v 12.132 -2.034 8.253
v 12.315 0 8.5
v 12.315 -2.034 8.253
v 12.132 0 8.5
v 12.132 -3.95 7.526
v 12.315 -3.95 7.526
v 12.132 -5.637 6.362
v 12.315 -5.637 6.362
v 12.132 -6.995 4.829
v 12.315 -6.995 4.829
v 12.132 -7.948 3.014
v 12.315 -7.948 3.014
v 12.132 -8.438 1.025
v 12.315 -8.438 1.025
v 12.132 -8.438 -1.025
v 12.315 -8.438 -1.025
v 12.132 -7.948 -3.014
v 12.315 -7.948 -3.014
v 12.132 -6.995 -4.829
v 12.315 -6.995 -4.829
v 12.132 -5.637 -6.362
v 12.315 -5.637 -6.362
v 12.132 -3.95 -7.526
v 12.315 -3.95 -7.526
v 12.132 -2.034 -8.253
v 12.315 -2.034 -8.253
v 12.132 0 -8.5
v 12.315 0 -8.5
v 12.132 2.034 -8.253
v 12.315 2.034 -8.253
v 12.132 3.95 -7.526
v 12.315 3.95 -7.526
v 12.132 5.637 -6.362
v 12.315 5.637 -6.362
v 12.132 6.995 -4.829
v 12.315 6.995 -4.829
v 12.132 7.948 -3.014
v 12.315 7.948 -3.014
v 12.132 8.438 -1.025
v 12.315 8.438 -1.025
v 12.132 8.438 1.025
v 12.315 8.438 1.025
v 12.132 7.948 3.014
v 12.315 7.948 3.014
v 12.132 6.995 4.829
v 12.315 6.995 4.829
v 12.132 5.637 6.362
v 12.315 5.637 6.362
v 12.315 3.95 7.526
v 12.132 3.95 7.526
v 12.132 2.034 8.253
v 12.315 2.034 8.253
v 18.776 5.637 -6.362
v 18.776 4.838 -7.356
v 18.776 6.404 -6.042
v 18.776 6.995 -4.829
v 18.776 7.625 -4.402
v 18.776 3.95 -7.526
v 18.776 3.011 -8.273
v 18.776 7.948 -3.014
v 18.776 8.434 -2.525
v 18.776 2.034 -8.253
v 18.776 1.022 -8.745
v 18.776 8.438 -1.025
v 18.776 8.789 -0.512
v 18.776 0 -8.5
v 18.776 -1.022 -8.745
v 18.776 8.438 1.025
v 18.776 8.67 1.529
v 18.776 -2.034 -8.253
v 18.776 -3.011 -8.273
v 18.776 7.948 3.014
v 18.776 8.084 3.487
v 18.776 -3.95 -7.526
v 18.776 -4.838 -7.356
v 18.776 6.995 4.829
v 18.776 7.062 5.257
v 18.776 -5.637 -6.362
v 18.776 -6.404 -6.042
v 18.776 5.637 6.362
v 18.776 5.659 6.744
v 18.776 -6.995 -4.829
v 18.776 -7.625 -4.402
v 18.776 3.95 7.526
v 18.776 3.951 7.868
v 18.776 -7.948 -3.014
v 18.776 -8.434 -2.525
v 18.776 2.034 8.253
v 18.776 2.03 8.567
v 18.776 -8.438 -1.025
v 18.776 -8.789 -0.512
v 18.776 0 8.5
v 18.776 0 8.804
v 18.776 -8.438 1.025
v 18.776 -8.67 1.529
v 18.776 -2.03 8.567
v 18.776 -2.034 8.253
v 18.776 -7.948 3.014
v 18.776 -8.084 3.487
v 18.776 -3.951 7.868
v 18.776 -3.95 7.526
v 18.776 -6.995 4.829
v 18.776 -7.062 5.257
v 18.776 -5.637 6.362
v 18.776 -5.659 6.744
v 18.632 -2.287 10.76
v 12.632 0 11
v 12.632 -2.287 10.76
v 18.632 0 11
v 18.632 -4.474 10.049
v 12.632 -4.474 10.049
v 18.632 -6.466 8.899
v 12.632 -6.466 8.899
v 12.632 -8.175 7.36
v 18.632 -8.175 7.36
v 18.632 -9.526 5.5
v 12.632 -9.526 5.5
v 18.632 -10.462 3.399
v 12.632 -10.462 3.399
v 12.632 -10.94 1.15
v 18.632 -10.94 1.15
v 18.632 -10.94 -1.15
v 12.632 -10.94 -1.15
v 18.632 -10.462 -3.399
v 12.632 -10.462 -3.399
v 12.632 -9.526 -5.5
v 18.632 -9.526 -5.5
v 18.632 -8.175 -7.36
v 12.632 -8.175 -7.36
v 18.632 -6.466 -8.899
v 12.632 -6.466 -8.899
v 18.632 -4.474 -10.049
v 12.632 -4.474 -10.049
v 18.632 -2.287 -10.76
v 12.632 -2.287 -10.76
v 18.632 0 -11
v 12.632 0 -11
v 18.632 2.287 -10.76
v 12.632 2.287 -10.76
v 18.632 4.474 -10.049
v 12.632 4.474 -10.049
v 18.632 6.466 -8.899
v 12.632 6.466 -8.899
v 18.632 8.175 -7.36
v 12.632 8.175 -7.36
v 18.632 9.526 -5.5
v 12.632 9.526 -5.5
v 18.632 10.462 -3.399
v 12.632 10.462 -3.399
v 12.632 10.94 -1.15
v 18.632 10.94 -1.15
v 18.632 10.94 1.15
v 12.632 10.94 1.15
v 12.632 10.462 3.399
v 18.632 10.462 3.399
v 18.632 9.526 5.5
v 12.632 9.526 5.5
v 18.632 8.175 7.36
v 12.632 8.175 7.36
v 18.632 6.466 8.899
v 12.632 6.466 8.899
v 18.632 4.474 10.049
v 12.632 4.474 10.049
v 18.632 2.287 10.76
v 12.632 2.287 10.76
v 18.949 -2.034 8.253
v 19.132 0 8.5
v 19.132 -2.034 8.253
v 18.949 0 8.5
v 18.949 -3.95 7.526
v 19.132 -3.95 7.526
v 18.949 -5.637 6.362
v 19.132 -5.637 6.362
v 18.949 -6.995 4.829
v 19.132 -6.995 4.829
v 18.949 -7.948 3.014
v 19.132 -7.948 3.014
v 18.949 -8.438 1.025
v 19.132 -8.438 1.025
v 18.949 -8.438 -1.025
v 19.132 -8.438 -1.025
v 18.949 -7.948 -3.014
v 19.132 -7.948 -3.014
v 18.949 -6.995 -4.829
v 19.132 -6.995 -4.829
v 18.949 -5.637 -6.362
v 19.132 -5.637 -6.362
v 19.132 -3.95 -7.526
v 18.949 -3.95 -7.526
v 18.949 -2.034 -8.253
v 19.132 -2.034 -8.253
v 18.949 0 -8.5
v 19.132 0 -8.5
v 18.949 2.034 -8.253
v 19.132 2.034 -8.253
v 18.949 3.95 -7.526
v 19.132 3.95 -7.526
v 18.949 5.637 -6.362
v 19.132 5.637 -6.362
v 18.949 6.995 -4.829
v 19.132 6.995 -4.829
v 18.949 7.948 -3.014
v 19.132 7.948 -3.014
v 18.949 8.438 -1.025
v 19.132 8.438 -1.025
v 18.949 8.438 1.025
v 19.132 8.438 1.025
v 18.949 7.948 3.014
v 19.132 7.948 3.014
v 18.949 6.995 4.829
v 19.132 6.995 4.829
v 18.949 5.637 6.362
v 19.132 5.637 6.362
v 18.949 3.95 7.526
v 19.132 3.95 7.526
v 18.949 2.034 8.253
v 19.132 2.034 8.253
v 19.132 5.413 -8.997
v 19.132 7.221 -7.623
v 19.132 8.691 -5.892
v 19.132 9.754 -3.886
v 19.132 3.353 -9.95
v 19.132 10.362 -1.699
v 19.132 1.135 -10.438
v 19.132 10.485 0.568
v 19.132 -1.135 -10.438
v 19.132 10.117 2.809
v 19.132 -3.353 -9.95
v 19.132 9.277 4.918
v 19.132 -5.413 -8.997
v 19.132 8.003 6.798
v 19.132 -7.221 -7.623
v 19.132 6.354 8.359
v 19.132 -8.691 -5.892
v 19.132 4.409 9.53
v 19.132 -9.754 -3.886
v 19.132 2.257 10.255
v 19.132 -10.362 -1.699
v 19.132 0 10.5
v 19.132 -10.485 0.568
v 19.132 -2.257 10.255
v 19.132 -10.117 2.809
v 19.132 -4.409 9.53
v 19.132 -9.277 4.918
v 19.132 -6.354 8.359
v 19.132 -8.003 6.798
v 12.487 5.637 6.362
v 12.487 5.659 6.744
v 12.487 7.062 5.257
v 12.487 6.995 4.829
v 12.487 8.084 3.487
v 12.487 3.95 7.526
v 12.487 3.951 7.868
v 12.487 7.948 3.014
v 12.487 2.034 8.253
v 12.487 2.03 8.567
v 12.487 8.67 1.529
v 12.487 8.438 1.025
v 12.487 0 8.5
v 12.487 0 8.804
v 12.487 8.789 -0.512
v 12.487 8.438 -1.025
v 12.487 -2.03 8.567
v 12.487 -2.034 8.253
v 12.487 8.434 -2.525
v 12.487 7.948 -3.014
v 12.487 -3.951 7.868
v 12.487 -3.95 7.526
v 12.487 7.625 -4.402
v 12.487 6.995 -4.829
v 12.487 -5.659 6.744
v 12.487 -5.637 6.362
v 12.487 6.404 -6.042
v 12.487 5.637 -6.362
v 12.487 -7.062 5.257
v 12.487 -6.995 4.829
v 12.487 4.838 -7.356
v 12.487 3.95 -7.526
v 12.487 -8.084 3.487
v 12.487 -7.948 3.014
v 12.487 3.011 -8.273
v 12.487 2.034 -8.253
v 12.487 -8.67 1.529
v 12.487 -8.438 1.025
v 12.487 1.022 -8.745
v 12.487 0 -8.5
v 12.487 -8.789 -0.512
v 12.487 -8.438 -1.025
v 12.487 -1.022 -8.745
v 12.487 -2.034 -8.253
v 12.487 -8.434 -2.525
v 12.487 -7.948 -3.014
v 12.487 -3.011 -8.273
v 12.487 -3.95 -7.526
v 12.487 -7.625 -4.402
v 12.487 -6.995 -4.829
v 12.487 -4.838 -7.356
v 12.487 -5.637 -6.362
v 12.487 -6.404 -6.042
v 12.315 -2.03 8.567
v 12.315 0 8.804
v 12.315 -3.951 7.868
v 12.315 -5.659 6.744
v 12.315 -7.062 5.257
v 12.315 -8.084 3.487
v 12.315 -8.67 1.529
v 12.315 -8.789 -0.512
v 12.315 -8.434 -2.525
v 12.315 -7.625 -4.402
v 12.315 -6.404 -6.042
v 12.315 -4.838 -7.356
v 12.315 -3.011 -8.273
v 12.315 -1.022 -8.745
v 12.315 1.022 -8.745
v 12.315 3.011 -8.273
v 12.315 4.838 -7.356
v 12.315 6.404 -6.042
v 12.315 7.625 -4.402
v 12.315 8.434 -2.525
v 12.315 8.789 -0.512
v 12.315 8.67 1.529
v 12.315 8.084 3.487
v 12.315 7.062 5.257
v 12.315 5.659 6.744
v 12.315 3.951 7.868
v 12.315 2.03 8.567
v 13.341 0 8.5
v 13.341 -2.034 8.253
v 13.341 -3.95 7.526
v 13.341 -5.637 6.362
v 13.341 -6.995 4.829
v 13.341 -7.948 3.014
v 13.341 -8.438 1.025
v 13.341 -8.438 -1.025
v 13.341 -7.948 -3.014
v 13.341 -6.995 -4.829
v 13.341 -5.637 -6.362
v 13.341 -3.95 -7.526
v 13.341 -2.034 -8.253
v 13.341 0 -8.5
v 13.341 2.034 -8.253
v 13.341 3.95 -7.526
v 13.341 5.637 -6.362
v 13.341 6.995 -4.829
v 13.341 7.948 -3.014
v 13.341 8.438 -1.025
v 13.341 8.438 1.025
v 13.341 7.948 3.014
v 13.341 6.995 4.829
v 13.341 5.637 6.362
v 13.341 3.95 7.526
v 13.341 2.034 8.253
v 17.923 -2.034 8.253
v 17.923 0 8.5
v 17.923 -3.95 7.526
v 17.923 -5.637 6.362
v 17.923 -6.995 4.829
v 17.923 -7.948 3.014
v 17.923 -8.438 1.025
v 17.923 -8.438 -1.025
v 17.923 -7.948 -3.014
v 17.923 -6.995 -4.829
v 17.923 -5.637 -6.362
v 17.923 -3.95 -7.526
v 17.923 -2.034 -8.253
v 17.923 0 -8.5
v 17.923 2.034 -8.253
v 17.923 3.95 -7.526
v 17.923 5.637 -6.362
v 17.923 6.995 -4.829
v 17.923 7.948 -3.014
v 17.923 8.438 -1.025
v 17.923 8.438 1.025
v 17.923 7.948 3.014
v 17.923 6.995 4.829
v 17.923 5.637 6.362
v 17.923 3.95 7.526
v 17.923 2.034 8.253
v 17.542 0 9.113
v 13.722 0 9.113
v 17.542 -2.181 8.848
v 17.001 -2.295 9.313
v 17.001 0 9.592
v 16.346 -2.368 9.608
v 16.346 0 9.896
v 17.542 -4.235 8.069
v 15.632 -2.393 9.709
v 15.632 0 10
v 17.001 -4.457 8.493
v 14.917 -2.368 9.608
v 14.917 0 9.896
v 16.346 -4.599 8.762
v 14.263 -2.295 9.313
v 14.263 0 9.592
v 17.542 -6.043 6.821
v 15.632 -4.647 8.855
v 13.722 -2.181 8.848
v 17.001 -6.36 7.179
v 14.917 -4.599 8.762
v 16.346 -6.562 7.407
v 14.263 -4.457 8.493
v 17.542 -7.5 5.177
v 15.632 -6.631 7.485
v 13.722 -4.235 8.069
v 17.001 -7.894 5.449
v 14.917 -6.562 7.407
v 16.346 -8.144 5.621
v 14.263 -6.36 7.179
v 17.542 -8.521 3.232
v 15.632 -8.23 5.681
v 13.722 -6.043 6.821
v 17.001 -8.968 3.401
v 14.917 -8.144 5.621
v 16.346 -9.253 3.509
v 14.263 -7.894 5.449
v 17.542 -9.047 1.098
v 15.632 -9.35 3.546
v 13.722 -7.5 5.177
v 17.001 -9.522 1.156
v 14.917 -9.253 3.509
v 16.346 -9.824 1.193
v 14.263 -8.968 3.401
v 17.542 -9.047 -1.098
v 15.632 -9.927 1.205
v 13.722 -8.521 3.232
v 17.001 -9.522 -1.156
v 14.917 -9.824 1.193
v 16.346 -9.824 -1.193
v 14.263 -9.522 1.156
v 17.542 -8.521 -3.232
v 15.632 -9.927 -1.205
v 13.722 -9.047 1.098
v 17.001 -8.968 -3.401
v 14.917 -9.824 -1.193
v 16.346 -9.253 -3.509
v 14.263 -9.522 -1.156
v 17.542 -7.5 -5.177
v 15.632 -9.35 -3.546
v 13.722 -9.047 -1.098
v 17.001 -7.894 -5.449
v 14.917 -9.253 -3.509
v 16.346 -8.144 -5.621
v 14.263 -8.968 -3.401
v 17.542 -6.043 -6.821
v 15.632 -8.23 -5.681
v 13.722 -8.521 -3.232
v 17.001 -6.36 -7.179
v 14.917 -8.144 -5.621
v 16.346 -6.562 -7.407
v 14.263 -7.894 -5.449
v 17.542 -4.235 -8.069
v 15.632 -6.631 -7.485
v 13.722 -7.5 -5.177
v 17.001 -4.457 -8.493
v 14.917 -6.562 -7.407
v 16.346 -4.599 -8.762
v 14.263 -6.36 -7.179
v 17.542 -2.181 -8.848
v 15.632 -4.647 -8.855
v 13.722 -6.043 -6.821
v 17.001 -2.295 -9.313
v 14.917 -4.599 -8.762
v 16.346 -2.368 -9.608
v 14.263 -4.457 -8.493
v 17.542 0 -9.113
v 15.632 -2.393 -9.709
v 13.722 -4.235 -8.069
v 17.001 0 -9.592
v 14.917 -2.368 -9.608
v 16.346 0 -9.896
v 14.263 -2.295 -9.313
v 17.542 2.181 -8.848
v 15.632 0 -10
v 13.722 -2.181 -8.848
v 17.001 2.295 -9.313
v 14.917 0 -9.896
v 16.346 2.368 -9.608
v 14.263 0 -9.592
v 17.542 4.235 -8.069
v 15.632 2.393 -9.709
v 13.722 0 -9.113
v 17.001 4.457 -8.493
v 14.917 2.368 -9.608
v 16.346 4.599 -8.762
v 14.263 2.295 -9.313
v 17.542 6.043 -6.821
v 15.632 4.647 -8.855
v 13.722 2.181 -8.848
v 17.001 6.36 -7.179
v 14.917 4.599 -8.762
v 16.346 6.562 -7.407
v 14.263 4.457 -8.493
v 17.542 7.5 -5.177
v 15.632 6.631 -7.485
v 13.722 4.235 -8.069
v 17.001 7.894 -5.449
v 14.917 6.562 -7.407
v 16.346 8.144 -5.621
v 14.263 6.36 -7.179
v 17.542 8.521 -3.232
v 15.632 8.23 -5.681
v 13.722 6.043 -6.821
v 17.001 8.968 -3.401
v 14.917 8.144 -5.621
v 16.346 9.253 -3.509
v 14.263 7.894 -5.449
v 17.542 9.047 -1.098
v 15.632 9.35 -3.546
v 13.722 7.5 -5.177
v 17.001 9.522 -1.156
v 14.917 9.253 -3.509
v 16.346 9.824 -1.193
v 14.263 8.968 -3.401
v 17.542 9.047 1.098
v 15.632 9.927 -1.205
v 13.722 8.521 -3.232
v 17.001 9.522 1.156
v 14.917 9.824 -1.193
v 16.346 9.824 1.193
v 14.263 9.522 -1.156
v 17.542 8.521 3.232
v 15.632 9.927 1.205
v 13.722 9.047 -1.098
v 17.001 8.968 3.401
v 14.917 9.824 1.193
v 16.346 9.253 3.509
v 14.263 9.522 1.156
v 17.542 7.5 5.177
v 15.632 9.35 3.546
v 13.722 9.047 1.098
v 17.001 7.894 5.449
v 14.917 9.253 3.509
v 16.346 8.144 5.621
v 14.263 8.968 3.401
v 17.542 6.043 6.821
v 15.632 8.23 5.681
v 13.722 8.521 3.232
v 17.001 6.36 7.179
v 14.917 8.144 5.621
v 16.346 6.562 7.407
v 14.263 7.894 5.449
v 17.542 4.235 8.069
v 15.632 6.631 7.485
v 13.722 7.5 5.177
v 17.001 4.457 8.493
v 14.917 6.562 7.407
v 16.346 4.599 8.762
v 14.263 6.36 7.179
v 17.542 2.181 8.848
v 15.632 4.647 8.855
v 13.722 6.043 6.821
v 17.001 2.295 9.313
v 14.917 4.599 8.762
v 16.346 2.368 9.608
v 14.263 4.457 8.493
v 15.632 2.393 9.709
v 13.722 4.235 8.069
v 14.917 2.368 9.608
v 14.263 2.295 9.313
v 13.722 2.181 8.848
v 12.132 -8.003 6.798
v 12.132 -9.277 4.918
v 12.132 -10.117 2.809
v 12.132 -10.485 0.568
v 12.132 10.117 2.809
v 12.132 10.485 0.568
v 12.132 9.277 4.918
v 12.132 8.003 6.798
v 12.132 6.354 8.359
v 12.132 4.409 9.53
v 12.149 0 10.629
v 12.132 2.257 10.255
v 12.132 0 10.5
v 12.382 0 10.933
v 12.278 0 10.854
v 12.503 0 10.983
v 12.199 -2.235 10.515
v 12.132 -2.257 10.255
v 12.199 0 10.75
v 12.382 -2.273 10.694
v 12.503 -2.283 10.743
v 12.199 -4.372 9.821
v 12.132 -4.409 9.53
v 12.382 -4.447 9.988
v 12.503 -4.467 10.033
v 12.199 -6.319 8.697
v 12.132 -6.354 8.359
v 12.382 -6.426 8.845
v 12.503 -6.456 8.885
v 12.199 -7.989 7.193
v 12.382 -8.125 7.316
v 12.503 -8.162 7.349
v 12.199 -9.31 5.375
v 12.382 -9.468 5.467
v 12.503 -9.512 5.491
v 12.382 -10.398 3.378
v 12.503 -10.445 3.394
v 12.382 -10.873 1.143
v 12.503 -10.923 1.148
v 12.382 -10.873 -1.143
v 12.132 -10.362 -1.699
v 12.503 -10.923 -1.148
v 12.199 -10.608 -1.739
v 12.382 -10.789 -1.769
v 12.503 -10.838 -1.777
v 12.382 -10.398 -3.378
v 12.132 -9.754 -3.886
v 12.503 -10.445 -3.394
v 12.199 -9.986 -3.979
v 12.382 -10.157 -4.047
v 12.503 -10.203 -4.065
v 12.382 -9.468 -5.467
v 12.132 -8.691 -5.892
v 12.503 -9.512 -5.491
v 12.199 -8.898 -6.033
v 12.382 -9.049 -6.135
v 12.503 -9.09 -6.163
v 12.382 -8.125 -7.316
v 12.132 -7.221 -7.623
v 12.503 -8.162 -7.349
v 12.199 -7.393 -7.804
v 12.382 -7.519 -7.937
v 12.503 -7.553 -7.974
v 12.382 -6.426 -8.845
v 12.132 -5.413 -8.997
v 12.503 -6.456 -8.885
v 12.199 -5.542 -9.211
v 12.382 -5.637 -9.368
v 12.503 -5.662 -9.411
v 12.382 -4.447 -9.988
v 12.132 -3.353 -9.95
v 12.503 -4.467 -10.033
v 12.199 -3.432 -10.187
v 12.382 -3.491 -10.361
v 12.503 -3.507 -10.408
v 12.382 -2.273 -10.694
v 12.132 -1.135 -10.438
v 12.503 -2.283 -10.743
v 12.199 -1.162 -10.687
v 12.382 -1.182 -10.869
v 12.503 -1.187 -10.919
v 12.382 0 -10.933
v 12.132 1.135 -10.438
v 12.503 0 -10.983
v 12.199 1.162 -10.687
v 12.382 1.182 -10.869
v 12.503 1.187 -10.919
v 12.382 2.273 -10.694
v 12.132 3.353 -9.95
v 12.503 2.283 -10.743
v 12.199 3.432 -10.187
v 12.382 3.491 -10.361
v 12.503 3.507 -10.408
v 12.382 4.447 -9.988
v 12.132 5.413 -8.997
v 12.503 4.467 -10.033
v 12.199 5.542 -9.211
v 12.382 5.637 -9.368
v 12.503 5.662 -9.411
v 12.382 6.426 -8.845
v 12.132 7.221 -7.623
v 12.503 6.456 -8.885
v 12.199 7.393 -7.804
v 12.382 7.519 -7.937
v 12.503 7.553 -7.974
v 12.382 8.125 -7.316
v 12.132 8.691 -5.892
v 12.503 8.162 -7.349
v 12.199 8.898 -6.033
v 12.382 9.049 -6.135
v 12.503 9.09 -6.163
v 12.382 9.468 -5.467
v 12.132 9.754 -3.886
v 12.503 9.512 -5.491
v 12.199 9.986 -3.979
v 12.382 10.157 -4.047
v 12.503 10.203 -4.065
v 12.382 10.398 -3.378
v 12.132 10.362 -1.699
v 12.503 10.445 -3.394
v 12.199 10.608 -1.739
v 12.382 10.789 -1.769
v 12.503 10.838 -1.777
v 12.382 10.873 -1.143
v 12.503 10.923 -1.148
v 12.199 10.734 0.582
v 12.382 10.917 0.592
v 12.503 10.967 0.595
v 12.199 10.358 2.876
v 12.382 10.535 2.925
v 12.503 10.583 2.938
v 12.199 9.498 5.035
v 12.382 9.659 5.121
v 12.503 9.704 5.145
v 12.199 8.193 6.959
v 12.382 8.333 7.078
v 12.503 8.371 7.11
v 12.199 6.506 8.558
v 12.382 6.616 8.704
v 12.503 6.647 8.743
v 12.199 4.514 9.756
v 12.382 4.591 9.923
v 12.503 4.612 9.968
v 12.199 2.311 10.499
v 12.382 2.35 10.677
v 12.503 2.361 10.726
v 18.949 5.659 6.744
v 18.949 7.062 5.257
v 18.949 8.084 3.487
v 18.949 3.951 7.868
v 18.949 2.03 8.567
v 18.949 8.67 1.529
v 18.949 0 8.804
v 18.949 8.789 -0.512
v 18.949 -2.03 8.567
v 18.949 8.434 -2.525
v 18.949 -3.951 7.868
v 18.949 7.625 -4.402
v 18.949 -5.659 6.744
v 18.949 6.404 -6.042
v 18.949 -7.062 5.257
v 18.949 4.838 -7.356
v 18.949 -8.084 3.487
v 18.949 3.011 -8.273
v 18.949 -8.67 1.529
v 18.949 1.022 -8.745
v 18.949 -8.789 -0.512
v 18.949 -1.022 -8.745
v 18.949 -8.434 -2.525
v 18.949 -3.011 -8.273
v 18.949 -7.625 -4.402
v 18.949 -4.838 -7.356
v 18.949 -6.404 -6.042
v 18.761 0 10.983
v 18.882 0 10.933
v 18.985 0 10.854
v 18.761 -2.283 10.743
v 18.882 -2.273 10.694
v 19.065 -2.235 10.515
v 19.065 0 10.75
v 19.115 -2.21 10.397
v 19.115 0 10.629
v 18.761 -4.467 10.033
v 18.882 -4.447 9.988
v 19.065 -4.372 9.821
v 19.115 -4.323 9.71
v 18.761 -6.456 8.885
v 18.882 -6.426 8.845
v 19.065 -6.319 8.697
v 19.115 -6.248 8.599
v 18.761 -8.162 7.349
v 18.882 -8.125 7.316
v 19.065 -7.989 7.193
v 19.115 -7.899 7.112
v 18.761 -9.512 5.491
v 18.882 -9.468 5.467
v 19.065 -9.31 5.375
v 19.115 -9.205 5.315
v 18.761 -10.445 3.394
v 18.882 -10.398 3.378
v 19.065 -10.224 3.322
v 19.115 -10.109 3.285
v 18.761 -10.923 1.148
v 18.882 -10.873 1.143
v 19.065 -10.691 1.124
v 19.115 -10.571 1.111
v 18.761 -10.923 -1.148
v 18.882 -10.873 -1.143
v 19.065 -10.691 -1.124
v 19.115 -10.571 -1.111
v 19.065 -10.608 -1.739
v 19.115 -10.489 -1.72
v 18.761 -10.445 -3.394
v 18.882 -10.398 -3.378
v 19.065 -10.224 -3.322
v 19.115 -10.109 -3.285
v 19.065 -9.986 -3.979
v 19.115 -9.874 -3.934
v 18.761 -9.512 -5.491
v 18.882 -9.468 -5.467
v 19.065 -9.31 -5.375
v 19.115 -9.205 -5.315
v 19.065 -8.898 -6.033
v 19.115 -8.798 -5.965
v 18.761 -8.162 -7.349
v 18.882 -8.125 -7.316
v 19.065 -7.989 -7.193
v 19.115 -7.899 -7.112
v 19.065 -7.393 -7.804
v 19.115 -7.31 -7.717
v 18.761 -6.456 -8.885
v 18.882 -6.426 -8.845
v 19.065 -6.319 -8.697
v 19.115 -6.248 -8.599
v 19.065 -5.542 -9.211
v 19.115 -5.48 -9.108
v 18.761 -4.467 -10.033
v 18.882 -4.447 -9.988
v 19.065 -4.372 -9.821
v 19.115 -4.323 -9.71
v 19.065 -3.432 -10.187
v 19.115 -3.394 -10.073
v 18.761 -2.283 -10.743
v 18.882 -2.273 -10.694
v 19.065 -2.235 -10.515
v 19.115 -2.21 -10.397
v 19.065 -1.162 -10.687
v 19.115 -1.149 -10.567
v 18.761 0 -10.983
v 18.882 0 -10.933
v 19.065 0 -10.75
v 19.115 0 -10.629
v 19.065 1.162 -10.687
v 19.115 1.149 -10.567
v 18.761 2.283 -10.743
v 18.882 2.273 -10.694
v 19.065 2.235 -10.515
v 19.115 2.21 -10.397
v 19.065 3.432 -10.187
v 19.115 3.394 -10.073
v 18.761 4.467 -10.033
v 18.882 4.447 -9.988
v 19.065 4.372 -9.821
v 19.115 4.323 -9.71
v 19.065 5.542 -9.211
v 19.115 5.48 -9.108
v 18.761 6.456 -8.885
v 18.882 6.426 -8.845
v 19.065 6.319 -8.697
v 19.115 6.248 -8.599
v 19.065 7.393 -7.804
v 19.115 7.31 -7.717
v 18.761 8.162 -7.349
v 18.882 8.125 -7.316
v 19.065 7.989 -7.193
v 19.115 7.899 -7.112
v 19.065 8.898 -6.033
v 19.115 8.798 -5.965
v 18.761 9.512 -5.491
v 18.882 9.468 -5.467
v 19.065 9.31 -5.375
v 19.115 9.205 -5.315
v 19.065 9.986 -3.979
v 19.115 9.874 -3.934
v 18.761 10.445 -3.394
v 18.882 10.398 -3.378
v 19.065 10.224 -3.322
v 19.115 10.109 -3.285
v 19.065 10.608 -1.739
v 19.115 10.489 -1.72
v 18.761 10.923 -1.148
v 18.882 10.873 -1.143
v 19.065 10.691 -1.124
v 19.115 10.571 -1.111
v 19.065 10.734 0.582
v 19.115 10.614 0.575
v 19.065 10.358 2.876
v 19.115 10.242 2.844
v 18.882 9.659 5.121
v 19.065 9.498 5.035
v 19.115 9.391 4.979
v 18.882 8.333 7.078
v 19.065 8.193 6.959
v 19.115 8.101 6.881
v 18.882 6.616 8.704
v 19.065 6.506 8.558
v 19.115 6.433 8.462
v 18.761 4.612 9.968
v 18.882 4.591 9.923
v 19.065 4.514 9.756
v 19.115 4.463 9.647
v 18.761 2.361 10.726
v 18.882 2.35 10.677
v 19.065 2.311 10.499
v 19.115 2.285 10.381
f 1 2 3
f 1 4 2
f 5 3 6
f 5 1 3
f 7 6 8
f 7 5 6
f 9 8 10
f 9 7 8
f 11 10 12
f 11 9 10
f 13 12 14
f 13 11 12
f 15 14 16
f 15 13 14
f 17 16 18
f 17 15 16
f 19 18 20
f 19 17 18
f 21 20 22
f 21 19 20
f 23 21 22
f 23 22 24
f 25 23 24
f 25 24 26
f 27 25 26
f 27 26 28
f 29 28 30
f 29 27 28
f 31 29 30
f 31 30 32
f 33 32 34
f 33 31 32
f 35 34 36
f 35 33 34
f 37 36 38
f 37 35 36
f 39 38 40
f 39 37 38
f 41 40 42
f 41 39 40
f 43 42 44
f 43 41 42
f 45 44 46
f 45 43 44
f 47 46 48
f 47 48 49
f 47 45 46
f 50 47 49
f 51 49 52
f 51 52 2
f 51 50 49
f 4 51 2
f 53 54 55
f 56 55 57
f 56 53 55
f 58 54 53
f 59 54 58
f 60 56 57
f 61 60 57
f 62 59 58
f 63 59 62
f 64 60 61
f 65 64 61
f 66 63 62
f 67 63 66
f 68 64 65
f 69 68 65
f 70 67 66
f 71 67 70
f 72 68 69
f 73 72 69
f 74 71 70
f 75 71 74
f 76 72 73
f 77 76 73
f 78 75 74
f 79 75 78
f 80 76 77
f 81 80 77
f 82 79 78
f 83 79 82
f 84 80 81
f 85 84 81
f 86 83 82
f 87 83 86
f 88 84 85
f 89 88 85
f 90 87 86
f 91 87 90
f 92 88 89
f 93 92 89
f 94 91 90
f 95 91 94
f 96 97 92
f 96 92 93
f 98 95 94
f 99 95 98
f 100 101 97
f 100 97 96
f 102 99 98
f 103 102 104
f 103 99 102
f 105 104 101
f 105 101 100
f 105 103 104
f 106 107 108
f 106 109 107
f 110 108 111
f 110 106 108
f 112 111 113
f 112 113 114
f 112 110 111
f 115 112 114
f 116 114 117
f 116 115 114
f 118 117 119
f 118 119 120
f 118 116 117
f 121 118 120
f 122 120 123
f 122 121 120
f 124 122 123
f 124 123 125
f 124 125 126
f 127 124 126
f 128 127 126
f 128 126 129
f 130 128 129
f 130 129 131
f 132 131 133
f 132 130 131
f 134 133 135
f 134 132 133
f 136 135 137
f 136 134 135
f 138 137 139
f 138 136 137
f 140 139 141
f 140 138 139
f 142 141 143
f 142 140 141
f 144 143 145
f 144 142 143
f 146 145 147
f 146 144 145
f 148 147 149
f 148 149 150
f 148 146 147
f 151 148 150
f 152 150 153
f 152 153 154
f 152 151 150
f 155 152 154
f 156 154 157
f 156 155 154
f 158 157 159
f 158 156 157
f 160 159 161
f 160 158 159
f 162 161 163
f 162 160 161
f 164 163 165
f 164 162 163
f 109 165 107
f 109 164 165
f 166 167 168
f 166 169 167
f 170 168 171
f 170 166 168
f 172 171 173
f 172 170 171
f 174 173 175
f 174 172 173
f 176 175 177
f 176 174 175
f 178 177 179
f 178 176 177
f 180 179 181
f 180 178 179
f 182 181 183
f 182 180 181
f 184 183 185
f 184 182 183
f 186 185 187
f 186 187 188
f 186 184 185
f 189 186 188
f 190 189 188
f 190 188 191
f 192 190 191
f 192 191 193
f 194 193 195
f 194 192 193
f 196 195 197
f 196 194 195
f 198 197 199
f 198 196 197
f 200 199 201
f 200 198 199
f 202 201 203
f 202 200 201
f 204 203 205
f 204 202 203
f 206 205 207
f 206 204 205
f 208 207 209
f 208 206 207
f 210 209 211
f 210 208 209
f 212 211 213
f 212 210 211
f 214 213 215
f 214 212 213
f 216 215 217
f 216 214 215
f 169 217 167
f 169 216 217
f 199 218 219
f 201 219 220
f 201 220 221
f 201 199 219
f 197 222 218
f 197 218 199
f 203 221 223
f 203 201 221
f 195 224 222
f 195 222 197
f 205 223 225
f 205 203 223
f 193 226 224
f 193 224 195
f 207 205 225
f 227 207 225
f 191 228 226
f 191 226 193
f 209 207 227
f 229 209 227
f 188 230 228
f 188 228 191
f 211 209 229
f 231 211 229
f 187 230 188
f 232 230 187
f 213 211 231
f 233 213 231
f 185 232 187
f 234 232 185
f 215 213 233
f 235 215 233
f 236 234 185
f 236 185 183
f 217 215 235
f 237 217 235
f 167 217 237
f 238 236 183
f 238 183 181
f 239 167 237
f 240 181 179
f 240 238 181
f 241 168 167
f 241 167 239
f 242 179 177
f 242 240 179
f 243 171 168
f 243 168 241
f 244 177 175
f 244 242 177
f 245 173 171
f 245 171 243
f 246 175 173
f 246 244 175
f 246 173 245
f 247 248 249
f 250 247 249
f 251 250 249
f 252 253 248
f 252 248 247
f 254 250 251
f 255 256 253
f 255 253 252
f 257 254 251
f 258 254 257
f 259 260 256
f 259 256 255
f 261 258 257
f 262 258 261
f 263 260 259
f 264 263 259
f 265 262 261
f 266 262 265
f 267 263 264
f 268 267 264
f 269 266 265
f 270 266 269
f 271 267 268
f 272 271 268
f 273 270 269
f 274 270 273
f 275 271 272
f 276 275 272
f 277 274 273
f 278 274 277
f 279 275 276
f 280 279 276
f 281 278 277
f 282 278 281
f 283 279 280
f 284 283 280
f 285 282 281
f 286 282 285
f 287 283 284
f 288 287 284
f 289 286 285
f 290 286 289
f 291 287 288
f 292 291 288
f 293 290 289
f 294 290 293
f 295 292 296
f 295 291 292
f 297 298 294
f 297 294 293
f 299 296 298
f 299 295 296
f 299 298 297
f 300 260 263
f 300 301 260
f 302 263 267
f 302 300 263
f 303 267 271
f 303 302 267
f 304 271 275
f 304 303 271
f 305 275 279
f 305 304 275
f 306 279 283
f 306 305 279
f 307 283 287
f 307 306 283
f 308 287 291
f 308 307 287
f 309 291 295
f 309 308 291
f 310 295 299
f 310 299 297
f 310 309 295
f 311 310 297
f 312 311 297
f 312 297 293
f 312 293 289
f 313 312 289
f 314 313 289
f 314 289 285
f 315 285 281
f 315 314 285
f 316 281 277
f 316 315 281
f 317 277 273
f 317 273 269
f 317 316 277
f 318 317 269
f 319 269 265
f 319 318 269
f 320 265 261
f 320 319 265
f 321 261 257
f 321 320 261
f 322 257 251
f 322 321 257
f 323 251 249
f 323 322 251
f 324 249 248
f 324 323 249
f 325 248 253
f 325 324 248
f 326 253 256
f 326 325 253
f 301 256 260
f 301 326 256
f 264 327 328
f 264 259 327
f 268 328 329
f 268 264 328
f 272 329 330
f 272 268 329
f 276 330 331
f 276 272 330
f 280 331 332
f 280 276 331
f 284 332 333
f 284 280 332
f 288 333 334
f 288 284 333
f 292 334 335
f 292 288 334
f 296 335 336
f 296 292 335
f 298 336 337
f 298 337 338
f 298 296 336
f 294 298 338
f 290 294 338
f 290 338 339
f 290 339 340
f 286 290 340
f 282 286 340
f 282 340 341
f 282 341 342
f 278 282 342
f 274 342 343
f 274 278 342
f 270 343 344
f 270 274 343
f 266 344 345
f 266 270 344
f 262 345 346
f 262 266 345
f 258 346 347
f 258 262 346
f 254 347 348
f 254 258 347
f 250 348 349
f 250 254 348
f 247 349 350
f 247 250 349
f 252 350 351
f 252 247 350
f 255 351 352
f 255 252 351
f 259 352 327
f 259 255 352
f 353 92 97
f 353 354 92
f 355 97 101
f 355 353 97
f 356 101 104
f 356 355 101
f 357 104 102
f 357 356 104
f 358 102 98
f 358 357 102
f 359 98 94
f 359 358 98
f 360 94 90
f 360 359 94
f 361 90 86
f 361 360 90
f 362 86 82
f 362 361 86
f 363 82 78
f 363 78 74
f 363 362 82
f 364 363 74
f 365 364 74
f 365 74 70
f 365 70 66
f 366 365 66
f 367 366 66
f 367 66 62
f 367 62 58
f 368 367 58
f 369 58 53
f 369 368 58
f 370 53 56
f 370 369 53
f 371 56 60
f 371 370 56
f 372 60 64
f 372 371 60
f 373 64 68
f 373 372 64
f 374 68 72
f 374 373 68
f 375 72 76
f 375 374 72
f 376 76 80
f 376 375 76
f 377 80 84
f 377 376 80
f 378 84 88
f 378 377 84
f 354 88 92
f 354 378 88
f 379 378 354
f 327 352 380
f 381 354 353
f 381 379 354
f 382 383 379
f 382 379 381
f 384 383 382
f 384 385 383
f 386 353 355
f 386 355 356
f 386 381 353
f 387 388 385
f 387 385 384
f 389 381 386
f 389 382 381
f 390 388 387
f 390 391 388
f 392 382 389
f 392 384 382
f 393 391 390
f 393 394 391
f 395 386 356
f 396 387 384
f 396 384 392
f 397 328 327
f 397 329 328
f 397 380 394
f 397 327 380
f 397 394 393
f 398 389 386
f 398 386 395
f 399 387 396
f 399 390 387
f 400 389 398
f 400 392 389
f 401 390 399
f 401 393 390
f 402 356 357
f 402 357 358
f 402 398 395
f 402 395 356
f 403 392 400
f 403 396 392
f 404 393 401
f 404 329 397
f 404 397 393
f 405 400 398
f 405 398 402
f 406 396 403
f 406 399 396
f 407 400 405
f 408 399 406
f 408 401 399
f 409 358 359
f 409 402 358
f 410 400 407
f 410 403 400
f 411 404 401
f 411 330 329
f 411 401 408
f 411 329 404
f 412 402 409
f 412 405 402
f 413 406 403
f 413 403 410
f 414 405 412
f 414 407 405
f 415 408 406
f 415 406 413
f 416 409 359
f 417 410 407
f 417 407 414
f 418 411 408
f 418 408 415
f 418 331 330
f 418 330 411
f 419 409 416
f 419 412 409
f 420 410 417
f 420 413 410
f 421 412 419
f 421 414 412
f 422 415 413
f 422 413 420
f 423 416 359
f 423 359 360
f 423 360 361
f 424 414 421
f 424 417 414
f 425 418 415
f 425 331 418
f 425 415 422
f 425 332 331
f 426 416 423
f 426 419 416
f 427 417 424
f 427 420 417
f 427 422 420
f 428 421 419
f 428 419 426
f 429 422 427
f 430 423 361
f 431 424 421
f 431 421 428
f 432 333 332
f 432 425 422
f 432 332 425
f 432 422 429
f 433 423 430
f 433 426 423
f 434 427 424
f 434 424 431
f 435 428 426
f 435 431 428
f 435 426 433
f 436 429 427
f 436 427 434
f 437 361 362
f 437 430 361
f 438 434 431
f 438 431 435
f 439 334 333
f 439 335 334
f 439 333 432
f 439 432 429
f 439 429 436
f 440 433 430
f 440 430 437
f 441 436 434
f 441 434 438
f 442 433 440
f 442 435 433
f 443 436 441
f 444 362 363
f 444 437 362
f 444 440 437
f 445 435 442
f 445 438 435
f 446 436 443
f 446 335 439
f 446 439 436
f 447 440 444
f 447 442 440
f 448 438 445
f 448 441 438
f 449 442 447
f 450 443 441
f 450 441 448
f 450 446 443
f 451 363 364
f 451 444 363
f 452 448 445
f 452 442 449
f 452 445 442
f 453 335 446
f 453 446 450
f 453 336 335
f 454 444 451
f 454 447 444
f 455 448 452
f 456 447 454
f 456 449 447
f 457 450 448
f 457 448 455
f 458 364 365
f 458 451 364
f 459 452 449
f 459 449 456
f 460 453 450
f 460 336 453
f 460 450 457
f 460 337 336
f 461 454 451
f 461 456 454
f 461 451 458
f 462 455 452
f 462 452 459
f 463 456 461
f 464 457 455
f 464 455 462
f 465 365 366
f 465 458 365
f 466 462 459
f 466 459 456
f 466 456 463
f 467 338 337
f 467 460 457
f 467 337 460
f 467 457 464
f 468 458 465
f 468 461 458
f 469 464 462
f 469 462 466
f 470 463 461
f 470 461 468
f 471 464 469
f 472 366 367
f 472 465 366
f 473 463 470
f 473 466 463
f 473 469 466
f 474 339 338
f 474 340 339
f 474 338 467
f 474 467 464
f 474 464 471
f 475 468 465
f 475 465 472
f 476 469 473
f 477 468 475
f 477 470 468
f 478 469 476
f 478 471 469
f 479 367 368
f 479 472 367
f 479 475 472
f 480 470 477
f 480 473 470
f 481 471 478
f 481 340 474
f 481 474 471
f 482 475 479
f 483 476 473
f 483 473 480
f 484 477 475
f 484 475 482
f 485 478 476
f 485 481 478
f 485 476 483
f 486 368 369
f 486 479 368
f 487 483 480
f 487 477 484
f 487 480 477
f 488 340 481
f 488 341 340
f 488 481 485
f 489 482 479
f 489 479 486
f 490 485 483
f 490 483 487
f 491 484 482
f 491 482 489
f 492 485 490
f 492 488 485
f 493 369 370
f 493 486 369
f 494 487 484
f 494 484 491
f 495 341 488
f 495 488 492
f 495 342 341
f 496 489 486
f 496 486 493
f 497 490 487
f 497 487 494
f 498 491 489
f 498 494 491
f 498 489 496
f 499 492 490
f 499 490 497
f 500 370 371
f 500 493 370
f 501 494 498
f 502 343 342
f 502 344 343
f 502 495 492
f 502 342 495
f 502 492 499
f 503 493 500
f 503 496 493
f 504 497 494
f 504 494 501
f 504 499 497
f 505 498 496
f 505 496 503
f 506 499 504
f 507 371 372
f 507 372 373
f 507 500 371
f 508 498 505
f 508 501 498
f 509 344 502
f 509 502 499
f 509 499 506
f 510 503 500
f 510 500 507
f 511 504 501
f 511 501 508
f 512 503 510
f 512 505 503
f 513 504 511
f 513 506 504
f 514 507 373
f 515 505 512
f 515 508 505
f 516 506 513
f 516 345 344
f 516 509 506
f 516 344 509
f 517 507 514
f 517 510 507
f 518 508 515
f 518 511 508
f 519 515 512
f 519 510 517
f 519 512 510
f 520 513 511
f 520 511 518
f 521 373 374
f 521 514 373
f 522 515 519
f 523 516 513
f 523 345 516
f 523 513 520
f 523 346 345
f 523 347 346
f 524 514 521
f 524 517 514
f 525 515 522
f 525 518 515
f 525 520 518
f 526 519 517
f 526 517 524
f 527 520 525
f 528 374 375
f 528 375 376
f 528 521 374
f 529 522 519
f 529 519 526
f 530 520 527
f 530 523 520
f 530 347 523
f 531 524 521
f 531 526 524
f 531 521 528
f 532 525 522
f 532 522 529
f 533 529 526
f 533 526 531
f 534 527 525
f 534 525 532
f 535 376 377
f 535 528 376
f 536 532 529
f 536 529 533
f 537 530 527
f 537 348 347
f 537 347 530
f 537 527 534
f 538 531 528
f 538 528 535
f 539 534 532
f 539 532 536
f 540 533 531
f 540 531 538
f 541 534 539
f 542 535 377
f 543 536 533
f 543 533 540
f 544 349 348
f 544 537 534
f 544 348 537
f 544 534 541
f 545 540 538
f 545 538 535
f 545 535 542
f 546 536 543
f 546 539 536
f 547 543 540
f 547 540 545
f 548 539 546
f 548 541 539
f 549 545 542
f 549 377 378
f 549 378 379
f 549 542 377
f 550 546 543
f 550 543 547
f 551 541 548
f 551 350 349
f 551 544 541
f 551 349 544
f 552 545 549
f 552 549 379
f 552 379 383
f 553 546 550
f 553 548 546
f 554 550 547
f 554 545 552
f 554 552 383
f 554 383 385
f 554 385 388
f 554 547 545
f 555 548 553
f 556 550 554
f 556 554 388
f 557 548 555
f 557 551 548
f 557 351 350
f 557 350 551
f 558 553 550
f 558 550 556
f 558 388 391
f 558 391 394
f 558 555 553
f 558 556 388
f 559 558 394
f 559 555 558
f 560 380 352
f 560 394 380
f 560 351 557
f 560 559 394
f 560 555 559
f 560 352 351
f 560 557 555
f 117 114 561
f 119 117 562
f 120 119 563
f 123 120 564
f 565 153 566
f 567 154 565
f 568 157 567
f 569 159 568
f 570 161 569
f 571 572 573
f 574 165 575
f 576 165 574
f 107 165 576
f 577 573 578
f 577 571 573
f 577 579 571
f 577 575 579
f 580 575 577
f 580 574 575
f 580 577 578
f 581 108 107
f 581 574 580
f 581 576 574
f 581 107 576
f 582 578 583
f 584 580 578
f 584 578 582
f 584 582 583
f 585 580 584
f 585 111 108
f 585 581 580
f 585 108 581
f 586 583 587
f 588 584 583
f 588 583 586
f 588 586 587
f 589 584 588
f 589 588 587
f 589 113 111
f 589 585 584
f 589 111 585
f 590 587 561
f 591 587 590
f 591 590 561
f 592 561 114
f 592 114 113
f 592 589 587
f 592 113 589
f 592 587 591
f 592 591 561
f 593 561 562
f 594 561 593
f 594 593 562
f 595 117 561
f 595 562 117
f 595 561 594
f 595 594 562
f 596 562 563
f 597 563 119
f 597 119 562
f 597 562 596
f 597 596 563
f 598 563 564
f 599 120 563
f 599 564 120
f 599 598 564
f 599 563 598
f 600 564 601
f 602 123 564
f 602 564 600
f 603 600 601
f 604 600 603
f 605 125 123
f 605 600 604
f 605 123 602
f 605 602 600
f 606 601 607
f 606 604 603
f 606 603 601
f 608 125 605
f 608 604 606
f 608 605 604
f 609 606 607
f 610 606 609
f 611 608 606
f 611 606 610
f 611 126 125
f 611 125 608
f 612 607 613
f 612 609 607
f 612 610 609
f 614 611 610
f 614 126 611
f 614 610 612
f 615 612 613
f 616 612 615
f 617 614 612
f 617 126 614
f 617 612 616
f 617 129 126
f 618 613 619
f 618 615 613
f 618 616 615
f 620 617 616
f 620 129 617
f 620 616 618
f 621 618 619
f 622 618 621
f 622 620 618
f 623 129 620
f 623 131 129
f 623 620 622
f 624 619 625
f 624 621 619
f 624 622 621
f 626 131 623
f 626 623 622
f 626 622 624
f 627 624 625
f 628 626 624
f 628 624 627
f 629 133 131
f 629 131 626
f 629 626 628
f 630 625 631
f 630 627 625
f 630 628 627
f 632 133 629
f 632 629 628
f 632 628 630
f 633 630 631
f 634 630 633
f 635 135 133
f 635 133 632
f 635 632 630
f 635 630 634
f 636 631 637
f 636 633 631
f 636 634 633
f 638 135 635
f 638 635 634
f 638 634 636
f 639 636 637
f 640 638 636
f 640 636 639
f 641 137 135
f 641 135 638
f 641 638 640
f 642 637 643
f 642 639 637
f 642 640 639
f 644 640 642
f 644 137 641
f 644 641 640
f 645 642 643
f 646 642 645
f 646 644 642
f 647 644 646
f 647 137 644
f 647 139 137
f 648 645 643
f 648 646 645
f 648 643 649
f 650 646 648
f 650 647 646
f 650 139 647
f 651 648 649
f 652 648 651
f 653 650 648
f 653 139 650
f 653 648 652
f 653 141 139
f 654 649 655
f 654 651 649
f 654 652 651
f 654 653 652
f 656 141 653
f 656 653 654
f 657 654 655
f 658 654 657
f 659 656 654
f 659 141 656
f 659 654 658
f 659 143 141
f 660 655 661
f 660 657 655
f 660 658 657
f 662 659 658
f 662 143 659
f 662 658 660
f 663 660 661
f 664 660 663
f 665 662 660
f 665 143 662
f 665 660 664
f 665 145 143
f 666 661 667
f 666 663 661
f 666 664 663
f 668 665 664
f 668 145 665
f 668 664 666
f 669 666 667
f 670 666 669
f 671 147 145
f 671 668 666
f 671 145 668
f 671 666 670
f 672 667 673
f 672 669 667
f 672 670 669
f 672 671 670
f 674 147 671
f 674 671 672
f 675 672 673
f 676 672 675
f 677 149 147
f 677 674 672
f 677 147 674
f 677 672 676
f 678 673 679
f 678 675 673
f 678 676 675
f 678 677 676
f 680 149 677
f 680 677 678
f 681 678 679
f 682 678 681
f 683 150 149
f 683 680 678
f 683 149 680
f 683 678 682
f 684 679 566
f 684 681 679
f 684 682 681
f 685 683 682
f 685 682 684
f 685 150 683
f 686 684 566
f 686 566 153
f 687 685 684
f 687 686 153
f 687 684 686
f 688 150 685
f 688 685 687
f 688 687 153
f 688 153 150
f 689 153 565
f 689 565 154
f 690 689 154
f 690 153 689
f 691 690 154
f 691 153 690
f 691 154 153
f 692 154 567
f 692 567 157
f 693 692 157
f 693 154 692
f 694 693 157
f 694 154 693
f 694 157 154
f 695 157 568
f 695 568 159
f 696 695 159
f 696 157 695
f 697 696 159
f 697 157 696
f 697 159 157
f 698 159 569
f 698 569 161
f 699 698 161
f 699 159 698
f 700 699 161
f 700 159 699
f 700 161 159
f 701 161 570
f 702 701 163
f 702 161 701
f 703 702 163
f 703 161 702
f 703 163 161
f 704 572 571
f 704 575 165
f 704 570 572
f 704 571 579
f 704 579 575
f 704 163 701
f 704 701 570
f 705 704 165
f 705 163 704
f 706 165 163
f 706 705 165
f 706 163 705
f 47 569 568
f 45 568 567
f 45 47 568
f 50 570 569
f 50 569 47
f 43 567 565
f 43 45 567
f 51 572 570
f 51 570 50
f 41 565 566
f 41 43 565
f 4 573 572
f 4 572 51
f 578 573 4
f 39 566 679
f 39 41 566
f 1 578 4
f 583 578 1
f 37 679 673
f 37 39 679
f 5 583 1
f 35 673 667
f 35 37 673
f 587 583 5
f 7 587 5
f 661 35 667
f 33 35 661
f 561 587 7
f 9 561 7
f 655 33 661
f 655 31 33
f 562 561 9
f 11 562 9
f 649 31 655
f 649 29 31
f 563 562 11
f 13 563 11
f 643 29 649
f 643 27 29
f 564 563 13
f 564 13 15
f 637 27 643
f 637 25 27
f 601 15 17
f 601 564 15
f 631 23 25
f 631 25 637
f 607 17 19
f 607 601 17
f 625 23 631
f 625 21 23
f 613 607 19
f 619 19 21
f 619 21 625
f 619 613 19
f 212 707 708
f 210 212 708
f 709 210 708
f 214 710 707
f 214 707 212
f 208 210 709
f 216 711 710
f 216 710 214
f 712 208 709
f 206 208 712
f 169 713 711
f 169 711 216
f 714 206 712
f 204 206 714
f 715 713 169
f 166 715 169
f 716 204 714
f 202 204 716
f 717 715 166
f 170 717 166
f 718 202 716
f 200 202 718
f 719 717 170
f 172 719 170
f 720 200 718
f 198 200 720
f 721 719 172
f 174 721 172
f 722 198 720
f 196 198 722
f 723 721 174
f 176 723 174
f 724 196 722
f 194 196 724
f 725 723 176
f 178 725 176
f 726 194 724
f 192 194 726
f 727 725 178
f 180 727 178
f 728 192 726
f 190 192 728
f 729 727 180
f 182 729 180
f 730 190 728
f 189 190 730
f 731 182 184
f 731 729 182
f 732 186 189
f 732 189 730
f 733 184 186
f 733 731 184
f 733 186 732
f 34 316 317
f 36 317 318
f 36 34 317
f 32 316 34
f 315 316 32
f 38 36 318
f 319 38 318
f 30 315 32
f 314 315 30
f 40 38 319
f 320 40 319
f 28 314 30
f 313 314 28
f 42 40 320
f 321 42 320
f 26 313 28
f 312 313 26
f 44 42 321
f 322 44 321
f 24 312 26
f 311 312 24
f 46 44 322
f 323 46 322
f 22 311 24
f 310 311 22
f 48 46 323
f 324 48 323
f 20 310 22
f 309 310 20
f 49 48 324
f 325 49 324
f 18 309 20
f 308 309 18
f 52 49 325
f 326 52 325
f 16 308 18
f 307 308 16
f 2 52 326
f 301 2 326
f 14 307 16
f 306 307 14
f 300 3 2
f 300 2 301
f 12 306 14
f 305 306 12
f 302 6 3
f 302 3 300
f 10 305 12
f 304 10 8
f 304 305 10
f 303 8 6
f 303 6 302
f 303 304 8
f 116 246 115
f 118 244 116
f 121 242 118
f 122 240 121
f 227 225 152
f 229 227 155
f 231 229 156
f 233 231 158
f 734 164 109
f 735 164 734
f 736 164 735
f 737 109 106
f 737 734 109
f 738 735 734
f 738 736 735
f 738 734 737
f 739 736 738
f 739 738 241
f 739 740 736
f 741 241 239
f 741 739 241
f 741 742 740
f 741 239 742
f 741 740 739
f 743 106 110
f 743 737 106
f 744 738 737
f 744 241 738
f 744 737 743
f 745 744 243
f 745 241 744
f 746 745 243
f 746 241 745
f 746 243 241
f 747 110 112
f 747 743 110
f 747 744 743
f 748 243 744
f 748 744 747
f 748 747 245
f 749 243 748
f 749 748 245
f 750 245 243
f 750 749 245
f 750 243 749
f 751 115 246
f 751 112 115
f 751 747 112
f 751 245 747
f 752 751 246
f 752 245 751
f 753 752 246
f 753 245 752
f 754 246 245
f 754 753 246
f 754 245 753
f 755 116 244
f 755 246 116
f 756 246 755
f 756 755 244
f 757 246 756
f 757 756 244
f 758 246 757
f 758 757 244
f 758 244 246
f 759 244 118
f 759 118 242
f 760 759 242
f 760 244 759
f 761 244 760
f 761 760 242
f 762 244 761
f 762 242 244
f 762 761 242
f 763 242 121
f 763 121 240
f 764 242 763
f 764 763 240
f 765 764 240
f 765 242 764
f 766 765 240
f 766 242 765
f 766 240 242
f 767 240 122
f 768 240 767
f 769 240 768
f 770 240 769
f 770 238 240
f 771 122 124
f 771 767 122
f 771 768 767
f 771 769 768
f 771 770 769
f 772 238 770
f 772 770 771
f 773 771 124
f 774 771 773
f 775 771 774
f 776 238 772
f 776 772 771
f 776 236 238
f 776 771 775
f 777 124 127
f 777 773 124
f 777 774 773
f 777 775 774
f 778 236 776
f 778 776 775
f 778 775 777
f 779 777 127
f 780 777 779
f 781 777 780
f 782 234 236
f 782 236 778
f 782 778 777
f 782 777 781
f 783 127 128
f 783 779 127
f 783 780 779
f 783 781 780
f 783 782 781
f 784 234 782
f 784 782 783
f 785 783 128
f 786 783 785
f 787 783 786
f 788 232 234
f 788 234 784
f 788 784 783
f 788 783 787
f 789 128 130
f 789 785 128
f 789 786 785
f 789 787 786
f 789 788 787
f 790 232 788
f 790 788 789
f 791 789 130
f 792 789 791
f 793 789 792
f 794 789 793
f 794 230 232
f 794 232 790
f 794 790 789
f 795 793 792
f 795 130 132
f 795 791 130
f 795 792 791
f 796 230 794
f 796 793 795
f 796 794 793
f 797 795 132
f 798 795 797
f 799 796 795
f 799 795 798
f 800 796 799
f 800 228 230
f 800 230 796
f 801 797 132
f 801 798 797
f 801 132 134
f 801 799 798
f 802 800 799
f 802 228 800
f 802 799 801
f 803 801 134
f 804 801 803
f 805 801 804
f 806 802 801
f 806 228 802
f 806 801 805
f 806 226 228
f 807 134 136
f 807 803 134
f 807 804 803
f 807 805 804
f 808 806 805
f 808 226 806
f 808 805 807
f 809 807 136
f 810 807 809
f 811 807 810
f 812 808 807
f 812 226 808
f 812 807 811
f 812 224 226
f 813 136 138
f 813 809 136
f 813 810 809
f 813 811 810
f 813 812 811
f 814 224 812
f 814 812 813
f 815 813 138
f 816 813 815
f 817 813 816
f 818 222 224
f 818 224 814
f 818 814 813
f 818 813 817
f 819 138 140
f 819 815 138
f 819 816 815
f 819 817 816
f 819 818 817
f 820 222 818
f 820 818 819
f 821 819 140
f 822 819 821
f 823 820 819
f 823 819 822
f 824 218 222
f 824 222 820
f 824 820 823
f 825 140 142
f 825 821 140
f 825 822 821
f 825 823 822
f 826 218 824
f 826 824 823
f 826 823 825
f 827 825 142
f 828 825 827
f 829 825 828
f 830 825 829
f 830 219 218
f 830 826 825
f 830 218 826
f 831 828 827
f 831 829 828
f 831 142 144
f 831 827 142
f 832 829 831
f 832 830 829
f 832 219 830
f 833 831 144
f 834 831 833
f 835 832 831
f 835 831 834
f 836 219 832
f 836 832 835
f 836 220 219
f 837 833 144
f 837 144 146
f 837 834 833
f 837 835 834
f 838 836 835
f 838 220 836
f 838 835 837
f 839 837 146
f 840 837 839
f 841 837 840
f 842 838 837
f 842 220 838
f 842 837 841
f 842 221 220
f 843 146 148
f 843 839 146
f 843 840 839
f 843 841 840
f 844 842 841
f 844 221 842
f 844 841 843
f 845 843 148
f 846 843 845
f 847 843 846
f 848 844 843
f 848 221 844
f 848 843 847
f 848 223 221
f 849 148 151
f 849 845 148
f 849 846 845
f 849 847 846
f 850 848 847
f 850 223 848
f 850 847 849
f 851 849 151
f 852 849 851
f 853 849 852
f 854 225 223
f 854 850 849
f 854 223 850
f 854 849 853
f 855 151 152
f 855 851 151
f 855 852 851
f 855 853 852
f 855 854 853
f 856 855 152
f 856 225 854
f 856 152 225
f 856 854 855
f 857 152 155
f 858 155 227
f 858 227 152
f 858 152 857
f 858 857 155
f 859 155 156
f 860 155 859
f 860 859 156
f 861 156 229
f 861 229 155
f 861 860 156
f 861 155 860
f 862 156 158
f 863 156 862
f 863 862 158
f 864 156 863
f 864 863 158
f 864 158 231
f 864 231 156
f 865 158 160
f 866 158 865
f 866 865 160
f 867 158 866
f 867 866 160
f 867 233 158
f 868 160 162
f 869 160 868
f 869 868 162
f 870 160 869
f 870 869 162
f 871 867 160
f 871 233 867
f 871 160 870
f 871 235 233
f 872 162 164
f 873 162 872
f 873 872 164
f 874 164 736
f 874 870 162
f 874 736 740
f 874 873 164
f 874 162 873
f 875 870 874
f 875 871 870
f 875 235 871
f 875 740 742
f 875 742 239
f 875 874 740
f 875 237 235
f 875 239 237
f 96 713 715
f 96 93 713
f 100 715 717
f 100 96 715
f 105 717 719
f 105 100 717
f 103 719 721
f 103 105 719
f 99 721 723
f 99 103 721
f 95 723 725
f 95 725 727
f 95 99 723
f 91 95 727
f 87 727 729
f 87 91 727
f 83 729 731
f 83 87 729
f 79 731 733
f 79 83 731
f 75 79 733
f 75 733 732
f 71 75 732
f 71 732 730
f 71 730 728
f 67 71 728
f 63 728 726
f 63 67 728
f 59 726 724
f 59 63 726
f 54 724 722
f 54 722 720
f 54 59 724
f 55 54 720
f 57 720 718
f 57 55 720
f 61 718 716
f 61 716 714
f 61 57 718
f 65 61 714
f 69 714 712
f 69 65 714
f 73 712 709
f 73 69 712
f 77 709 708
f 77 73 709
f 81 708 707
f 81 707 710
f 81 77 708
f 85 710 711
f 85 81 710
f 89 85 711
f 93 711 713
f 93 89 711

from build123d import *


with BuildPart() as part:
    # Esquisse1 → Révolution1 (revolve)
    with BuildSketch(Plane.XY, mode=Mode.PRIVATE) as r_volution1_sk:
        with BuildLine():
            Line((12.631924887, 11), (18.631924887, 11))
            ThreePointArc((18.631924887, 11), (18.985478277, 10.853553391), (19.131924887, 10.5))
            Line((19.131924887, 10.5), (19.131924887, 8.5))
            Line((19.131924887, 8.5), (18.949161839, 8.5))
            Line((18.949161839, 8.5), (18.949161839, 8.804039909))
            Line((18.949161839, 8.804039909), (18.77636399, 8.804039909))
            Line((18.77636399, 8.804039909), (18.77636399, 8.5))
            Line((18.77636399, 8.5), (17.923212734, 8.5))
            ThreePointArc((17.923212734, 8.5), (15.631924887, 10), (13.340637039, 8.5))
            Line((13.340637039, 8.5), (12.487485783, 8.5))
            Line((12.487485783, 8.5), (12.487485783, 8.804039909))
            Line((12.487485783, 8.804039909), (12.314687935, 8.804039909))
            Line((12.314687935, 8.804039909), (12.314687935, 8.5))
            Line((12.314687935, 8.5), (12.131924887, 8.5))
            Line((12.131924887, 8.5), (12.131924887, 10.5))
            ThreePointArc((12.131924887, 10.5), (12.278371496, 10.853553391), (12.631924887, 11))
        make_face()
    revolve(r_volution1_sk.sketch.rotate(Axis((8.800669459, 0, 0), (1, 0, 0)), 90), axis=Axis((8.800669459, 0, 0), (1, 0, 0)))


solid = part.part
